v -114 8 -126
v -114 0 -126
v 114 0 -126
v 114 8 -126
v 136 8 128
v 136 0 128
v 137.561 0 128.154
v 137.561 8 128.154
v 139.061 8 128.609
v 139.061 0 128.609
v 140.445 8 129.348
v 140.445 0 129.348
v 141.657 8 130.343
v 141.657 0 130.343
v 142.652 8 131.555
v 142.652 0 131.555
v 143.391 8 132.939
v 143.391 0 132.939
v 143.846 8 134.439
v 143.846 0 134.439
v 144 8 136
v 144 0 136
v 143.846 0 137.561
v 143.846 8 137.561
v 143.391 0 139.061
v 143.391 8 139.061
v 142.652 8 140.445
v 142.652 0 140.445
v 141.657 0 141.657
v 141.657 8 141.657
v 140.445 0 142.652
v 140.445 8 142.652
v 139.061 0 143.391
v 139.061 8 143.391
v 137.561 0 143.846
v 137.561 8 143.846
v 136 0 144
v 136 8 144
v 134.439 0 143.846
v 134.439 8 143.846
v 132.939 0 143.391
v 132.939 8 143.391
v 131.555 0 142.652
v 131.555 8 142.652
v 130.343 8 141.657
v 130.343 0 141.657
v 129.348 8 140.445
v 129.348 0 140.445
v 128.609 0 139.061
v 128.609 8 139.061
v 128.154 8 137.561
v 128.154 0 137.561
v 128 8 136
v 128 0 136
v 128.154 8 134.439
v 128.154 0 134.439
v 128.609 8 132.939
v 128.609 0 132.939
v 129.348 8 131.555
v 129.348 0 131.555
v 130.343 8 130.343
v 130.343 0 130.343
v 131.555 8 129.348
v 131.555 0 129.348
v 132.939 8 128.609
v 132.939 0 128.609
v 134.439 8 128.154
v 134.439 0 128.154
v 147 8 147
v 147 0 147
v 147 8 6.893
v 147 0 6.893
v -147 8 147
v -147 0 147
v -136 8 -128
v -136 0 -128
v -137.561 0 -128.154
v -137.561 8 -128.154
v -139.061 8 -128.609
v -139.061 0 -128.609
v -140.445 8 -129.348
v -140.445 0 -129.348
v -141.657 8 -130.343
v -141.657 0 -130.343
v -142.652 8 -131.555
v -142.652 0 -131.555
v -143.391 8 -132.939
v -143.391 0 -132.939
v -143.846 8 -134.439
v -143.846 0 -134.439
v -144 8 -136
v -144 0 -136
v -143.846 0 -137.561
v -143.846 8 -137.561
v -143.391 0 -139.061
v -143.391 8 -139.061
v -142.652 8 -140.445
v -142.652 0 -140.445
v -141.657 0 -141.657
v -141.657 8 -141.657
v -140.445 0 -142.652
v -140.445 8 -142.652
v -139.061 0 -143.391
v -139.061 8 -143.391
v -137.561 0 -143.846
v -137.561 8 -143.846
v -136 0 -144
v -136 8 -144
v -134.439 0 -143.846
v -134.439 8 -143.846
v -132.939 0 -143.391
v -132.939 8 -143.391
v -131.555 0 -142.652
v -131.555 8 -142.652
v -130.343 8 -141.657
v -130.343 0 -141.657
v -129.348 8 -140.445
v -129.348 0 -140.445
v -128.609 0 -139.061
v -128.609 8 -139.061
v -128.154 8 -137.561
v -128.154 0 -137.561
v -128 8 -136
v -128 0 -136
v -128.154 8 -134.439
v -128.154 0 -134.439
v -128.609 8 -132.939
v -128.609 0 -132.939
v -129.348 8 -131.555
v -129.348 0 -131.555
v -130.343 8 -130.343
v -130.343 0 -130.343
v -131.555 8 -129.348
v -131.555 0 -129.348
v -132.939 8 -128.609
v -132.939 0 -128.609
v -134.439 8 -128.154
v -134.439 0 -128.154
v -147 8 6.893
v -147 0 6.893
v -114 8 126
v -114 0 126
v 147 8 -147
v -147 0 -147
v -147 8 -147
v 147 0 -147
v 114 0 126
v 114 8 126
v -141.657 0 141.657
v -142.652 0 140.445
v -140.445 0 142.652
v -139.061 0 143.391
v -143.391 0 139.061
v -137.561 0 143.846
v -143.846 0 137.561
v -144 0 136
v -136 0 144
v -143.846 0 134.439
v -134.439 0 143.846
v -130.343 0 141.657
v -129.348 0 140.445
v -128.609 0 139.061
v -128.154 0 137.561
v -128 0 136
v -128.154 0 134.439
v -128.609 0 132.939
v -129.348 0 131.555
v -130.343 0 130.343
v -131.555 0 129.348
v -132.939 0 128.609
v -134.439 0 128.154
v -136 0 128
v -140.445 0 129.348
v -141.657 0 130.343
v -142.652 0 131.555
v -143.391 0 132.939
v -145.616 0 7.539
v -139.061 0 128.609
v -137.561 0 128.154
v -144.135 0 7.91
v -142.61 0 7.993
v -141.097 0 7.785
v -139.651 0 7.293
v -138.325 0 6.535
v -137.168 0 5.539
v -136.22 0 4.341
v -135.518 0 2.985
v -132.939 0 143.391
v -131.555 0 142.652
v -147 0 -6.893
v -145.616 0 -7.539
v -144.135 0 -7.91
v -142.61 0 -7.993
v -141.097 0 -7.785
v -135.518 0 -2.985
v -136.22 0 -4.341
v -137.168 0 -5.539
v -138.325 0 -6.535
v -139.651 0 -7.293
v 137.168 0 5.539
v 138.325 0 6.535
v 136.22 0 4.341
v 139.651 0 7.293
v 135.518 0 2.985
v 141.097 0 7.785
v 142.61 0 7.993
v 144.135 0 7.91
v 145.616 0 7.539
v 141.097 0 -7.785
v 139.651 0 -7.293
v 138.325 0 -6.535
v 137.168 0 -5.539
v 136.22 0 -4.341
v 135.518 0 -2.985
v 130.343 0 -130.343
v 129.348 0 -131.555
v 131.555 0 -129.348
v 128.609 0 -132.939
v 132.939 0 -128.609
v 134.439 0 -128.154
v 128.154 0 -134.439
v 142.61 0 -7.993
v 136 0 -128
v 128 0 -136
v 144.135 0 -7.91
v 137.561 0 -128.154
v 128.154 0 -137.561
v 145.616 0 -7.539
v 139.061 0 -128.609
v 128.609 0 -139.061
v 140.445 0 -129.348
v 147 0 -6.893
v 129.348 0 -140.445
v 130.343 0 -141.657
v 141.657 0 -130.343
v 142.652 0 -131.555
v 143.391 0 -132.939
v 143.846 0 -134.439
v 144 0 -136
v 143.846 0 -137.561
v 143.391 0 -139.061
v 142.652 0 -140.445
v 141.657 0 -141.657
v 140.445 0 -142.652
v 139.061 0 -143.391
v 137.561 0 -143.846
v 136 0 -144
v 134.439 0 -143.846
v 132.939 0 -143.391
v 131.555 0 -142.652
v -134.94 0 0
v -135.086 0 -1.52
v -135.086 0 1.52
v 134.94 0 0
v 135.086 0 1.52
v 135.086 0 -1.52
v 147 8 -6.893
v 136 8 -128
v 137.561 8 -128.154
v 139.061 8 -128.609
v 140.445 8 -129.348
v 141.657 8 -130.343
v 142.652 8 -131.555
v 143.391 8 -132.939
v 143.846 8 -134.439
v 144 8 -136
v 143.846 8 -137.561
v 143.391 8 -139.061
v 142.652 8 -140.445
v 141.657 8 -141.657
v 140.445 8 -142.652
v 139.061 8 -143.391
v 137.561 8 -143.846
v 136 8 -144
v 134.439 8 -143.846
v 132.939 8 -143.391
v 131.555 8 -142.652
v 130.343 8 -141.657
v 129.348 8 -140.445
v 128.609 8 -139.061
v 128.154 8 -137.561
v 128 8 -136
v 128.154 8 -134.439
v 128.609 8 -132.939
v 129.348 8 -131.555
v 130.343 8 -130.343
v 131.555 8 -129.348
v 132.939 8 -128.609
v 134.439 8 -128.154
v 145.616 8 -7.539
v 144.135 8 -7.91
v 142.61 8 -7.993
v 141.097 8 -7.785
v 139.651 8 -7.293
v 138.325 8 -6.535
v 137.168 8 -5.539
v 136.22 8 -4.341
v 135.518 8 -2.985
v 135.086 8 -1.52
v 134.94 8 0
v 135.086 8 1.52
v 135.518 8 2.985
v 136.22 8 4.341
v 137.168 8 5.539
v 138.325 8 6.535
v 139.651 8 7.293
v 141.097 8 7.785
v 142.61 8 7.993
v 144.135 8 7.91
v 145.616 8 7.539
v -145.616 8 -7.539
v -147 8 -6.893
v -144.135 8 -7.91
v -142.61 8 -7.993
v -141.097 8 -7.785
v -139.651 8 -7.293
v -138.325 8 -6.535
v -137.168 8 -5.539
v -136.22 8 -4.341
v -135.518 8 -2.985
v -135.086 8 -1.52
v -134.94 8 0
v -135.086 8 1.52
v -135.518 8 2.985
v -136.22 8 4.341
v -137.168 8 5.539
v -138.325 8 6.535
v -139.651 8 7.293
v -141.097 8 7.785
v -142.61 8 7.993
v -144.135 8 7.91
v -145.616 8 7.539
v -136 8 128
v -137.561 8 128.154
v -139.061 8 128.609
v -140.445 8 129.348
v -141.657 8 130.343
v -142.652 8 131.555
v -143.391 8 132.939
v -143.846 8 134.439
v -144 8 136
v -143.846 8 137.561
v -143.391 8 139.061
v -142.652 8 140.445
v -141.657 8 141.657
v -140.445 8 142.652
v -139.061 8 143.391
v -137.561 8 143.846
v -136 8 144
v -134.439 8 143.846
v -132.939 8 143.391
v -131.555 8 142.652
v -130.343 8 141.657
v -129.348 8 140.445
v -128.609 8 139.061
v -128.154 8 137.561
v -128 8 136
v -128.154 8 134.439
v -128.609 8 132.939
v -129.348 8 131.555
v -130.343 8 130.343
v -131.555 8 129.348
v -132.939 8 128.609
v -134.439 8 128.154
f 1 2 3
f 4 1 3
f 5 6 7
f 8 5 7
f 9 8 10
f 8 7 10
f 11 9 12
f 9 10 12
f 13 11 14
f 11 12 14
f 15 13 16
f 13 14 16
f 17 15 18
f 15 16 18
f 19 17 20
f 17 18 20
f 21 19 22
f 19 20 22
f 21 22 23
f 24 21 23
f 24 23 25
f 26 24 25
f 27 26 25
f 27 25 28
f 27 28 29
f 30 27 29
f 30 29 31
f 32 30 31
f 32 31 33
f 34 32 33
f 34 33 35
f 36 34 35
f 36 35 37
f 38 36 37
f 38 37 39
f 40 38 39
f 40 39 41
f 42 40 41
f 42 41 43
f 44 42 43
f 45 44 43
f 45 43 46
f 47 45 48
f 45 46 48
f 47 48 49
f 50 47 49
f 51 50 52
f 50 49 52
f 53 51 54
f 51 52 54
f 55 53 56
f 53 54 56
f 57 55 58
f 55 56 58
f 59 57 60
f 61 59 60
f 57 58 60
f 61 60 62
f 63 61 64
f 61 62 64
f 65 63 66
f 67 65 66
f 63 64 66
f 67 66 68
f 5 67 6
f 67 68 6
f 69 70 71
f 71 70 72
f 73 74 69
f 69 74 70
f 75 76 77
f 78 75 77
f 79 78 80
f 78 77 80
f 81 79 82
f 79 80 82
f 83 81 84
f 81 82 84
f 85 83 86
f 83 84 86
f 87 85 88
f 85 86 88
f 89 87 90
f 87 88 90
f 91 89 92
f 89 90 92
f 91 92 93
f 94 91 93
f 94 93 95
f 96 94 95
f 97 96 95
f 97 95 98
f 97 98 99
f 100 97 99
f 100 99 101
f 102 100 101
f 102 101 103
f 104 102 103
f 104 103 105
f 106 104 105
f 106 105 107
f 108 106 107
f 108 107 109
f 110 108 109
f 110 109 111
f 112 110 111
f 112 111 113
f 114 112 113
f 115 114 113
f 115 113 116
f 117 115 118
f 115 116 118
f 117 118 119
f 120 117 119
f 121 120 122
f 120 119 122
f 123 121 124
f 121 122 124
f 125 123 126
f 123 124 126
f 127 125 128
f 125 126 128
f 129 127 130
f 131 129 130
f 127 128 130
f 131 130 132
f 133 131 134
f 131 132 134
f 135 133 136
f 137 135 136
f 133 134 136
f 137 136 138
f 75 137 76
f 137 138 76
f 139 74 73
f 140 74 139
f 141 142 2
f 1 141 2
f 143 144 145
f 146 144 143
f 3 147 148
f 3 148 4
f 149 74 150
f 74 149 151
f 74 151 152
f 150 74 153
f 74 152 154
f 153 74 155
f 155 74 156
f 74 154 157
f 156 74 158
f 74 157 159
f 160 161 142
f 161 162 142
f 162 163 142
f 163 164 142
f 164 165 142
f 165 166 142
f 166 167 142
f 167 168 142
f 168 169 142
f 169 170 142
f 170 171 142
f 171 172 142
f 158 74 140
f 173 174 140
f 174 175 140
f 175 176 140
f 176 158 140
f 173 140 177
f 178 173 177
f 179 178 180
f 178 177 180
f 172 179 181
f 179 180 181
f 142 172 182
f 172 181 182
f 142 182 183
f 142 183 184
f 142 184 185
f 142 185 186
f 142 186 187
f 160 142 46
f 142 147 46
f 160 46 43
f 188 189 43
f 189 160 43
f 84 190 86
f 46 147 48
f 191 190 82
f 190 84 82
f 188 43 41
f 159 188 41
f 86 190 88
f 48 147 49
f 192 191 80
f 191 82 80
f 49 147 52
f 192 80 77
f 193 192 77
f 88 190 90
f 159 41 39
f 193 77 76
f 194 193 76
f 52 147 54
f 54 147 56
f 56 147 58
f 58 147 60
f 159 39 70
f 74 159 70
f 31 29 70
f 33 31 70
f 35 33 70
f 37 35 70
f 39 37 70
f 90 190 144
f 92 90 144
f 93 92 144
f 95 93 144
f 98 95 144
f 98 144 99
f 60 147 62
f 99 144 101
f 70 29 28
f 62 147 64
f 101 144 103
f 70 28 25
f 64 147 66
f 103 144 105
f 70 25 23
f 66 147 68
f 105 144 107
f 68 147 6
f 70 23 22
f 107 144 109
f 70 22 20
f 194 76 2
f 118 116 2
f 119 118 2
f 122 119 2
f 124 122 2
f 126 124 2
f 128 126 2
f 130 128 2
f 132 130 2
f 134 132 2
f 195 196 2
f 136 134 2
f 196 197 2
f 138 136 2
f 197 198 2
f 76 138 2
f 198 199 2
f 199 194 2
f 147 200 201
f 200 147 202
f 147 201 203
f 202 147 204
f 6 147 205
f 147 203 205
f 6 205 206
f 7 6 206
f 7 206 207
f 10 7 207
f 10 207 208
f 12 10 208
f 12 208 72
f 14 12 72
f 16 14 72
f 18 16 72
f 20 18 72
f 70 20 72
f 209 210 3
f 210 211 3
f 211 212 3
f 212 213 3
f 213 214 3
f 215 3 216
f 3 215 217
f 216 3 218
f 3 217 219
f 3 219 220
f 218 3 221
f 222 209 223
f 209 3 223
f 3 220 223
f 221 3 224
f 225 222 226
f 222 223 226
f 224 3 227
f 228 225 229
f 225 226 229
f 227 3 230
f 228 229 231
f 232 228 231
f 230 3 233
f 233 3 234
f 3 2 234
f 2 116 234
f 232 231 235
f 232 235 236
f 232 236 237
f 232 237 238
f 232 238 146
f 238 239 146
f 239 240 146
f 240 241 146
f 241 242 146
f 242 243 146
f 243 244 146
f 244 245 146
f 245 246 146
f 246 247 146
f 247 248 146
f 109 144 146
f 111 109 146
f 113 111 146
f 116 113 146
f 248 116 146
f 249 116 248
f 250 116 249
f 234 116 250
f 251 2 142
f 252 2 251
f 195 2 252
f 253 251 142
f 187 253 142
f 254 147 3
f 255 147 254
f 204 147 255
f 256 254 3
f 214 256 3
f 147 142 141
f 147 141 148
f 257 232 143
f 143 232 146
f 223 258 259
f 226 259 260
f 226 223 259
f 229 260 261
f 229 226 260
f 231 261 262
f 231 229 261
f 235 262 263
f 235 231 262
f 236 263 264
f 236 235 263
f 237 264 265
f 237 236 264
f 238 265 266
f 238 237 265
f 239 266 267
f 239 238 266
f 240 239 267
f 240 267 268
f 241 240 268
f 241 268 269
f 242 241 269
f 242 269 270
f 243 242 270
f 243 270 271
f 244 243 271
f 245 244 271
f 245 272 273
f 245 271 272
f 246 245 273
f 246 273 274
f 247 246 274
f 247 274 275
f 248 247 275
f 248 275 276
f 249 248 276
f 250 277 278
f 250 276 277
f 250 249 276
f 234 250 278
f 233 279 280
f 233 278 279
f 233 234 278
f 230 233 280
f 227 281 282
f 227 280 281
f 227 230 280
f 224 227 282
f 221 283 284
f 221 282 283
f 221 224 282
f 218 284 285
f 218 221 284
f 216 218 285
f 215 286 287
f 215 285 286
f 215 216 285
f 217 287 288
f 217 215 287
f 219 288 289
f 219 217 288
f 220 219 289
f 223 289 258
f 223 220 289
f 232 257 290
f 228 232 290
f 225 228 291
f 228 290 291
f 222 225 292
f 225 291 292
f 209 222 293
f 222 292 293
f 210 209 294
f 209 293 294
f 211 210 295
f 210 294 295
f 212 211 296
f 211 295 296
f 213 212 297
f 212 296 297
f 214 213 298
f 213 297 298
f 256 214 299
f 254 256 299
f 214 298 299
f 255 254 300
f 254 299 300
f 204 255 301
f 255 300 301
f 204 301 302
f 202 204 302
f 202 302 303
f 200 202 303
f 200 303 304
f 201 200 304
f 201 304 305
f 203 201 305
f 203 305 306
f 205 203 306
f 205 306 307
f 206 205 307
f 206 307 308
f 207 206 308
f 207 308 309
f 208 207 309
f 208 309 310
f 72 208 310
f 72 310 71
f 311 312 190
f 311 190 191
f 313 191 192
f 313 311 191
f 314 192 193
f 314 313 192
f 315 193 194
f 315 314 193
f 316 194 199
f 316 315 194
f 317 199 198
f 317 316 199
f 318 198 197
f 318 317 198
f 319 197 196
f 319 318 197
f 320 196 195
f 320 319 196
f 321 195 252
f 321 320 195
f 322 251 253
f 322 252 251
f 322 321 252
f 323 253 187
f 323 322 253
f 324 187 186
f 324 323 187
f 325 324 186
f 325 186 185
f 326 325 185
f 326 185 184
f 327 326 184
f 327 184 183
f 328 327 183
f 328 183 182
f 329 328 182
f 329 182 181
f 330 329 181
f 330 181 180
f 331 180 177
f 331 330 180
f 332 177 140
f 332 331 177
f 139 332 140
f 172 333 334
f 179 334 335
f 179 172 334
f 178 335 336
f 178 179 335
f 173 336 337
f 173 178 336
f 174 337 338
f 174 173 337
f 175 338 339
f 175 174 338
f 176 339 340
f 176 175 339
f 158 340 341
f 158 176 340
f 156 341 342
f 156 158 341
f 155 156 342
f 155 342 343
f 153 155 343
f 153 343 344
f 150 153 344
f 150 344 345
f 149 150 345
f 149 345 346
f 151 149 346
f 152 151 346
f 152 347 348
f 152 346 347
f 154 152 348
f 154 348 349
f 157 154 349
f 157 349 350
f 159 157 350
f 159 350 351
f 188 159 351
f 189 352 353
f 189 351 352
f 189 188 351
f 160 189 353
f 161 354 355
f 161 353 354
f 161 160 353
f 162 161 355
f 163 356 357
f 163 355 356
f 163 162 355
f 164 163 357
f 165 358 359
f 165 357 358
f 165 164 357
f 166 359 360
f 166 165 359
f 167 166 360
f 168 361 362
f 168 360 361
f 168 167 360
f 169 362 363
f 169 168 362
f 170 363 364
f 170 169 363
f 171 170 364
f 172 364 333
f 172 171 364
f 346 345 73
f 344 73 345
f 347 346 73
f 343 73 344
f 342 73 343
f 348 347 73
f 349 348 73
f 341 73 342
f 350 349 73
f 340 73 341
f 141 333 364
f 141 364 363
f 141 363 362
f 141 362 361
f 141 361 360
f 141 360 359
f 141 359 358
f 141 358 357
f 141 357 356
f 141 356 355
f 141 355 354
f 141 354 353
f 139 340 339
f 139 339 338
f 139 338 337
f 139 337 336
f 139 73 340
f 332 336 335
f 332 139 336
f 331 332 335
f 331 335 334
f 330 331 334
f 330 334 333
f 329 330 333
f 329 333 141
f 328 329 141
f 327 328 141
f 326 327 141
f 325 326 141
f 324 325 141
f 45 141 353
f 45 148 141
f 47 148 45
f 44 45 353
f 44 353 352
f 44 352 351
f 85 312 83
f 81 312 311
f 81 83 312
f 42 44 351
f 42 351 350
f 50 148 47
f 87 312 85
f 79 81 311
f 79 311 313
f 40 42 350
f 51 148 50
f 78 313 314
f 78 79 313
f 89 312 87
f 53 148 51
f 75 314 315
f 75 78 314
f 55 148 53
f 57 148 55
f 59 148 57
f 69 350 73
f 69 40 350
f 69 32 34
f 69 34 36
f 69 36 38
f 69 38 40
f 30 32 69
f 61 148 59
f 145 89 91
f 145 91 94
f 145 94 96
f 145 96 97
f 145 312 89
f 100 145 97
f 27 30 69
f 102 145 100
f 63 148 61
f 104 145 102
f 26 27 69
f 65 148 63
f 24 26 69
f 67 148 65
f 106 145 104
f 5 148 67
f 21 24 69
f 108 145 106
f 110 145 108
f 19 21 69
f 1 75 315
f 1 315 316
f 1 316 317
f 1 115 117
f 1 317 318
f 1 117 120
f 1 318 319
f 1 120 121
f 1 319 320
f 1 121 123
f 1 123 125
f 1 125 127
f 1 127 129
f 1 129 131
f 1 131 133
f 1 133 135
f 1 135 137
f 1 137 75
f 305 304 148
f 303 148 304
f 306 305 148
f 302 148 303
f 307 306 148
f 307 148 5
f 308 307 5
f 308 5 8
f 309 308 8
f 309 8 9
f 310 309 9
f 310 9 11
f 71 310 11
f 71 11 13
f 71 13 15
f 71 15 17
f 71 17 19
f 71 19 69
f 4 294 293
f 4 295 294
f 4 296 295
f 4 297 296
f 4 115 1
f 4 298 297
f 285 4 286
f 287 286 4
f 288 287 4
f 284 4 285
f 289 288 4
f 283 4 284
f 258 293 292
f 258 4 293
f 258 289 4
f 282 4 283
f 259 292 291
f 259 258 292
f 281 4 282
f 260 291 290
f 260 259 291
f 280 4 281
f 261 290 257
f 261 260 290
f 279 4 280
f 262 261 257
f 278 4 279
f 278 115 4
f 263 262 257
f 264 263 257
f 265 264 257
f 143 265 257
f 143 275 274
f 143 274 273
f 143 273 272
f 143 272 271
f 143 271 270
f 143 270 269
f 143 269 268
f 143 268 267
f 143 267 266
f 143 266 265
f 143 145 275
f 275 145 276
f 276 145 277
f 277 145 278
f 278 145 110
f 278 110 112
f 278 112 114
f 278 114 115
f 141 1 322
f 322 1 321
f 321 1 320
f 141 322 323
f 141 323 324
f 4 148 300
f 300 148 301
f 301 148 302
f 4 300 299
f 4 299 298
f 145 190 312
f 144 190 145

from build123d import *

# Parameters (mm, degrees)
SKETCH1_W               = 294
SKETCH1_H               = 294
SKETCH1_W_2             = 228
SKETCH1_H_2             = 252
BOSS_EXTRUDE1_DEPTH     = 8
SKETCH2_R               = 8
CUT_EXTRUDE1_DEPTH      = 209.043264731
SKETCH4_R               = 8
CUT_EXTRUDE2_DEPTH      = 209.043264731
MIRROR3_COPY_1_SKETCH_R = 8
MIRROR3_COPY_1_DEPTH    = 209.043264731


with BuildPart() as part:
    # Sketch1 → Boss-Extrude1 (new body)
    with BuildSketch(Plane(origin=(0, 0, 0), x_dir=(1, 0, 0), z_dir=(0, 1, 0))):
        Rectangle(SKETCH1_W, SKETCH1_H)
        Rectangle(SKETCH1_W_2, SKETCH1_H_2, mode=Mode.SUBTRACT)
    extrude(amount=BOSS_EXTRUDE1_DEPTH)

    # Sketch2 → Cut-Extrude1 (cut, through all)
    with BuildSketch(Plane(origin=(0, 0, 0), x_dir=(1, 0, 0), z_dir=(0, 1, 0))):
        with Locations(Location((136, 136, 0), (0, 0, 270))):
            Circle(SKETCH2_R)
    cut_extrude1 = extrude(amount=CUT_EXTRUDE1_DEPTH, mode=Mode.SUBTRACT)

    # Mirror2: Cut-Extrude1 across plane
    add(cut_extrude1.mirror(Plane.XY), mode=Mode.SUBTRACT)

    # Sketch4 → Cut-Extrude2 (cut, through all)
    with BuildSketch(Plane(origin=(0, 8, 0), x_dir=(1, 0, 0), z_dir=(0, 1, 0))):
        with Locations((142.94, 0)):
            Circle(SKETCH4_R)
    cut_extrude2 = extrude(amount=-CUT_EXTRUDE2_DEPTH, mode=Mode.SUBTRACT)

    # Mirror3: Cut-Extrude1, Cut-Extrude2 across plane
    add(cut_extrude1.mirror(Plane(origin=(0, 0, 0), x_dir=(0, 0, 1), z_dir=(1, 0, 0))), mode=Mode.SUBTRACT)
    add(cut_extrude2.mirror(Plane(origin=(0, 0, 0), x_dir=(0, 0, 1), z_dir=(1, 0, 0))), mode=Mode.SUBTRACT)

    # Mirror3 copy 1 sketch → Mirror3 copy 1 (cut, through all)
    with BuildSketch(Plane(origin=(0, 0, 0), x_dir=(-1, 0, 0), z_dir=(0, 1, 0))):
        with Locations(Location((136, 136, 0), (0, 0, 270))):
            Circle(MIRROR3_COPY_1_SKETCH_R)
    extrude(amount=MIRROR3_COPY_1_DEPTH, mode=Mode.SUBTRACT)


solid = part.part
